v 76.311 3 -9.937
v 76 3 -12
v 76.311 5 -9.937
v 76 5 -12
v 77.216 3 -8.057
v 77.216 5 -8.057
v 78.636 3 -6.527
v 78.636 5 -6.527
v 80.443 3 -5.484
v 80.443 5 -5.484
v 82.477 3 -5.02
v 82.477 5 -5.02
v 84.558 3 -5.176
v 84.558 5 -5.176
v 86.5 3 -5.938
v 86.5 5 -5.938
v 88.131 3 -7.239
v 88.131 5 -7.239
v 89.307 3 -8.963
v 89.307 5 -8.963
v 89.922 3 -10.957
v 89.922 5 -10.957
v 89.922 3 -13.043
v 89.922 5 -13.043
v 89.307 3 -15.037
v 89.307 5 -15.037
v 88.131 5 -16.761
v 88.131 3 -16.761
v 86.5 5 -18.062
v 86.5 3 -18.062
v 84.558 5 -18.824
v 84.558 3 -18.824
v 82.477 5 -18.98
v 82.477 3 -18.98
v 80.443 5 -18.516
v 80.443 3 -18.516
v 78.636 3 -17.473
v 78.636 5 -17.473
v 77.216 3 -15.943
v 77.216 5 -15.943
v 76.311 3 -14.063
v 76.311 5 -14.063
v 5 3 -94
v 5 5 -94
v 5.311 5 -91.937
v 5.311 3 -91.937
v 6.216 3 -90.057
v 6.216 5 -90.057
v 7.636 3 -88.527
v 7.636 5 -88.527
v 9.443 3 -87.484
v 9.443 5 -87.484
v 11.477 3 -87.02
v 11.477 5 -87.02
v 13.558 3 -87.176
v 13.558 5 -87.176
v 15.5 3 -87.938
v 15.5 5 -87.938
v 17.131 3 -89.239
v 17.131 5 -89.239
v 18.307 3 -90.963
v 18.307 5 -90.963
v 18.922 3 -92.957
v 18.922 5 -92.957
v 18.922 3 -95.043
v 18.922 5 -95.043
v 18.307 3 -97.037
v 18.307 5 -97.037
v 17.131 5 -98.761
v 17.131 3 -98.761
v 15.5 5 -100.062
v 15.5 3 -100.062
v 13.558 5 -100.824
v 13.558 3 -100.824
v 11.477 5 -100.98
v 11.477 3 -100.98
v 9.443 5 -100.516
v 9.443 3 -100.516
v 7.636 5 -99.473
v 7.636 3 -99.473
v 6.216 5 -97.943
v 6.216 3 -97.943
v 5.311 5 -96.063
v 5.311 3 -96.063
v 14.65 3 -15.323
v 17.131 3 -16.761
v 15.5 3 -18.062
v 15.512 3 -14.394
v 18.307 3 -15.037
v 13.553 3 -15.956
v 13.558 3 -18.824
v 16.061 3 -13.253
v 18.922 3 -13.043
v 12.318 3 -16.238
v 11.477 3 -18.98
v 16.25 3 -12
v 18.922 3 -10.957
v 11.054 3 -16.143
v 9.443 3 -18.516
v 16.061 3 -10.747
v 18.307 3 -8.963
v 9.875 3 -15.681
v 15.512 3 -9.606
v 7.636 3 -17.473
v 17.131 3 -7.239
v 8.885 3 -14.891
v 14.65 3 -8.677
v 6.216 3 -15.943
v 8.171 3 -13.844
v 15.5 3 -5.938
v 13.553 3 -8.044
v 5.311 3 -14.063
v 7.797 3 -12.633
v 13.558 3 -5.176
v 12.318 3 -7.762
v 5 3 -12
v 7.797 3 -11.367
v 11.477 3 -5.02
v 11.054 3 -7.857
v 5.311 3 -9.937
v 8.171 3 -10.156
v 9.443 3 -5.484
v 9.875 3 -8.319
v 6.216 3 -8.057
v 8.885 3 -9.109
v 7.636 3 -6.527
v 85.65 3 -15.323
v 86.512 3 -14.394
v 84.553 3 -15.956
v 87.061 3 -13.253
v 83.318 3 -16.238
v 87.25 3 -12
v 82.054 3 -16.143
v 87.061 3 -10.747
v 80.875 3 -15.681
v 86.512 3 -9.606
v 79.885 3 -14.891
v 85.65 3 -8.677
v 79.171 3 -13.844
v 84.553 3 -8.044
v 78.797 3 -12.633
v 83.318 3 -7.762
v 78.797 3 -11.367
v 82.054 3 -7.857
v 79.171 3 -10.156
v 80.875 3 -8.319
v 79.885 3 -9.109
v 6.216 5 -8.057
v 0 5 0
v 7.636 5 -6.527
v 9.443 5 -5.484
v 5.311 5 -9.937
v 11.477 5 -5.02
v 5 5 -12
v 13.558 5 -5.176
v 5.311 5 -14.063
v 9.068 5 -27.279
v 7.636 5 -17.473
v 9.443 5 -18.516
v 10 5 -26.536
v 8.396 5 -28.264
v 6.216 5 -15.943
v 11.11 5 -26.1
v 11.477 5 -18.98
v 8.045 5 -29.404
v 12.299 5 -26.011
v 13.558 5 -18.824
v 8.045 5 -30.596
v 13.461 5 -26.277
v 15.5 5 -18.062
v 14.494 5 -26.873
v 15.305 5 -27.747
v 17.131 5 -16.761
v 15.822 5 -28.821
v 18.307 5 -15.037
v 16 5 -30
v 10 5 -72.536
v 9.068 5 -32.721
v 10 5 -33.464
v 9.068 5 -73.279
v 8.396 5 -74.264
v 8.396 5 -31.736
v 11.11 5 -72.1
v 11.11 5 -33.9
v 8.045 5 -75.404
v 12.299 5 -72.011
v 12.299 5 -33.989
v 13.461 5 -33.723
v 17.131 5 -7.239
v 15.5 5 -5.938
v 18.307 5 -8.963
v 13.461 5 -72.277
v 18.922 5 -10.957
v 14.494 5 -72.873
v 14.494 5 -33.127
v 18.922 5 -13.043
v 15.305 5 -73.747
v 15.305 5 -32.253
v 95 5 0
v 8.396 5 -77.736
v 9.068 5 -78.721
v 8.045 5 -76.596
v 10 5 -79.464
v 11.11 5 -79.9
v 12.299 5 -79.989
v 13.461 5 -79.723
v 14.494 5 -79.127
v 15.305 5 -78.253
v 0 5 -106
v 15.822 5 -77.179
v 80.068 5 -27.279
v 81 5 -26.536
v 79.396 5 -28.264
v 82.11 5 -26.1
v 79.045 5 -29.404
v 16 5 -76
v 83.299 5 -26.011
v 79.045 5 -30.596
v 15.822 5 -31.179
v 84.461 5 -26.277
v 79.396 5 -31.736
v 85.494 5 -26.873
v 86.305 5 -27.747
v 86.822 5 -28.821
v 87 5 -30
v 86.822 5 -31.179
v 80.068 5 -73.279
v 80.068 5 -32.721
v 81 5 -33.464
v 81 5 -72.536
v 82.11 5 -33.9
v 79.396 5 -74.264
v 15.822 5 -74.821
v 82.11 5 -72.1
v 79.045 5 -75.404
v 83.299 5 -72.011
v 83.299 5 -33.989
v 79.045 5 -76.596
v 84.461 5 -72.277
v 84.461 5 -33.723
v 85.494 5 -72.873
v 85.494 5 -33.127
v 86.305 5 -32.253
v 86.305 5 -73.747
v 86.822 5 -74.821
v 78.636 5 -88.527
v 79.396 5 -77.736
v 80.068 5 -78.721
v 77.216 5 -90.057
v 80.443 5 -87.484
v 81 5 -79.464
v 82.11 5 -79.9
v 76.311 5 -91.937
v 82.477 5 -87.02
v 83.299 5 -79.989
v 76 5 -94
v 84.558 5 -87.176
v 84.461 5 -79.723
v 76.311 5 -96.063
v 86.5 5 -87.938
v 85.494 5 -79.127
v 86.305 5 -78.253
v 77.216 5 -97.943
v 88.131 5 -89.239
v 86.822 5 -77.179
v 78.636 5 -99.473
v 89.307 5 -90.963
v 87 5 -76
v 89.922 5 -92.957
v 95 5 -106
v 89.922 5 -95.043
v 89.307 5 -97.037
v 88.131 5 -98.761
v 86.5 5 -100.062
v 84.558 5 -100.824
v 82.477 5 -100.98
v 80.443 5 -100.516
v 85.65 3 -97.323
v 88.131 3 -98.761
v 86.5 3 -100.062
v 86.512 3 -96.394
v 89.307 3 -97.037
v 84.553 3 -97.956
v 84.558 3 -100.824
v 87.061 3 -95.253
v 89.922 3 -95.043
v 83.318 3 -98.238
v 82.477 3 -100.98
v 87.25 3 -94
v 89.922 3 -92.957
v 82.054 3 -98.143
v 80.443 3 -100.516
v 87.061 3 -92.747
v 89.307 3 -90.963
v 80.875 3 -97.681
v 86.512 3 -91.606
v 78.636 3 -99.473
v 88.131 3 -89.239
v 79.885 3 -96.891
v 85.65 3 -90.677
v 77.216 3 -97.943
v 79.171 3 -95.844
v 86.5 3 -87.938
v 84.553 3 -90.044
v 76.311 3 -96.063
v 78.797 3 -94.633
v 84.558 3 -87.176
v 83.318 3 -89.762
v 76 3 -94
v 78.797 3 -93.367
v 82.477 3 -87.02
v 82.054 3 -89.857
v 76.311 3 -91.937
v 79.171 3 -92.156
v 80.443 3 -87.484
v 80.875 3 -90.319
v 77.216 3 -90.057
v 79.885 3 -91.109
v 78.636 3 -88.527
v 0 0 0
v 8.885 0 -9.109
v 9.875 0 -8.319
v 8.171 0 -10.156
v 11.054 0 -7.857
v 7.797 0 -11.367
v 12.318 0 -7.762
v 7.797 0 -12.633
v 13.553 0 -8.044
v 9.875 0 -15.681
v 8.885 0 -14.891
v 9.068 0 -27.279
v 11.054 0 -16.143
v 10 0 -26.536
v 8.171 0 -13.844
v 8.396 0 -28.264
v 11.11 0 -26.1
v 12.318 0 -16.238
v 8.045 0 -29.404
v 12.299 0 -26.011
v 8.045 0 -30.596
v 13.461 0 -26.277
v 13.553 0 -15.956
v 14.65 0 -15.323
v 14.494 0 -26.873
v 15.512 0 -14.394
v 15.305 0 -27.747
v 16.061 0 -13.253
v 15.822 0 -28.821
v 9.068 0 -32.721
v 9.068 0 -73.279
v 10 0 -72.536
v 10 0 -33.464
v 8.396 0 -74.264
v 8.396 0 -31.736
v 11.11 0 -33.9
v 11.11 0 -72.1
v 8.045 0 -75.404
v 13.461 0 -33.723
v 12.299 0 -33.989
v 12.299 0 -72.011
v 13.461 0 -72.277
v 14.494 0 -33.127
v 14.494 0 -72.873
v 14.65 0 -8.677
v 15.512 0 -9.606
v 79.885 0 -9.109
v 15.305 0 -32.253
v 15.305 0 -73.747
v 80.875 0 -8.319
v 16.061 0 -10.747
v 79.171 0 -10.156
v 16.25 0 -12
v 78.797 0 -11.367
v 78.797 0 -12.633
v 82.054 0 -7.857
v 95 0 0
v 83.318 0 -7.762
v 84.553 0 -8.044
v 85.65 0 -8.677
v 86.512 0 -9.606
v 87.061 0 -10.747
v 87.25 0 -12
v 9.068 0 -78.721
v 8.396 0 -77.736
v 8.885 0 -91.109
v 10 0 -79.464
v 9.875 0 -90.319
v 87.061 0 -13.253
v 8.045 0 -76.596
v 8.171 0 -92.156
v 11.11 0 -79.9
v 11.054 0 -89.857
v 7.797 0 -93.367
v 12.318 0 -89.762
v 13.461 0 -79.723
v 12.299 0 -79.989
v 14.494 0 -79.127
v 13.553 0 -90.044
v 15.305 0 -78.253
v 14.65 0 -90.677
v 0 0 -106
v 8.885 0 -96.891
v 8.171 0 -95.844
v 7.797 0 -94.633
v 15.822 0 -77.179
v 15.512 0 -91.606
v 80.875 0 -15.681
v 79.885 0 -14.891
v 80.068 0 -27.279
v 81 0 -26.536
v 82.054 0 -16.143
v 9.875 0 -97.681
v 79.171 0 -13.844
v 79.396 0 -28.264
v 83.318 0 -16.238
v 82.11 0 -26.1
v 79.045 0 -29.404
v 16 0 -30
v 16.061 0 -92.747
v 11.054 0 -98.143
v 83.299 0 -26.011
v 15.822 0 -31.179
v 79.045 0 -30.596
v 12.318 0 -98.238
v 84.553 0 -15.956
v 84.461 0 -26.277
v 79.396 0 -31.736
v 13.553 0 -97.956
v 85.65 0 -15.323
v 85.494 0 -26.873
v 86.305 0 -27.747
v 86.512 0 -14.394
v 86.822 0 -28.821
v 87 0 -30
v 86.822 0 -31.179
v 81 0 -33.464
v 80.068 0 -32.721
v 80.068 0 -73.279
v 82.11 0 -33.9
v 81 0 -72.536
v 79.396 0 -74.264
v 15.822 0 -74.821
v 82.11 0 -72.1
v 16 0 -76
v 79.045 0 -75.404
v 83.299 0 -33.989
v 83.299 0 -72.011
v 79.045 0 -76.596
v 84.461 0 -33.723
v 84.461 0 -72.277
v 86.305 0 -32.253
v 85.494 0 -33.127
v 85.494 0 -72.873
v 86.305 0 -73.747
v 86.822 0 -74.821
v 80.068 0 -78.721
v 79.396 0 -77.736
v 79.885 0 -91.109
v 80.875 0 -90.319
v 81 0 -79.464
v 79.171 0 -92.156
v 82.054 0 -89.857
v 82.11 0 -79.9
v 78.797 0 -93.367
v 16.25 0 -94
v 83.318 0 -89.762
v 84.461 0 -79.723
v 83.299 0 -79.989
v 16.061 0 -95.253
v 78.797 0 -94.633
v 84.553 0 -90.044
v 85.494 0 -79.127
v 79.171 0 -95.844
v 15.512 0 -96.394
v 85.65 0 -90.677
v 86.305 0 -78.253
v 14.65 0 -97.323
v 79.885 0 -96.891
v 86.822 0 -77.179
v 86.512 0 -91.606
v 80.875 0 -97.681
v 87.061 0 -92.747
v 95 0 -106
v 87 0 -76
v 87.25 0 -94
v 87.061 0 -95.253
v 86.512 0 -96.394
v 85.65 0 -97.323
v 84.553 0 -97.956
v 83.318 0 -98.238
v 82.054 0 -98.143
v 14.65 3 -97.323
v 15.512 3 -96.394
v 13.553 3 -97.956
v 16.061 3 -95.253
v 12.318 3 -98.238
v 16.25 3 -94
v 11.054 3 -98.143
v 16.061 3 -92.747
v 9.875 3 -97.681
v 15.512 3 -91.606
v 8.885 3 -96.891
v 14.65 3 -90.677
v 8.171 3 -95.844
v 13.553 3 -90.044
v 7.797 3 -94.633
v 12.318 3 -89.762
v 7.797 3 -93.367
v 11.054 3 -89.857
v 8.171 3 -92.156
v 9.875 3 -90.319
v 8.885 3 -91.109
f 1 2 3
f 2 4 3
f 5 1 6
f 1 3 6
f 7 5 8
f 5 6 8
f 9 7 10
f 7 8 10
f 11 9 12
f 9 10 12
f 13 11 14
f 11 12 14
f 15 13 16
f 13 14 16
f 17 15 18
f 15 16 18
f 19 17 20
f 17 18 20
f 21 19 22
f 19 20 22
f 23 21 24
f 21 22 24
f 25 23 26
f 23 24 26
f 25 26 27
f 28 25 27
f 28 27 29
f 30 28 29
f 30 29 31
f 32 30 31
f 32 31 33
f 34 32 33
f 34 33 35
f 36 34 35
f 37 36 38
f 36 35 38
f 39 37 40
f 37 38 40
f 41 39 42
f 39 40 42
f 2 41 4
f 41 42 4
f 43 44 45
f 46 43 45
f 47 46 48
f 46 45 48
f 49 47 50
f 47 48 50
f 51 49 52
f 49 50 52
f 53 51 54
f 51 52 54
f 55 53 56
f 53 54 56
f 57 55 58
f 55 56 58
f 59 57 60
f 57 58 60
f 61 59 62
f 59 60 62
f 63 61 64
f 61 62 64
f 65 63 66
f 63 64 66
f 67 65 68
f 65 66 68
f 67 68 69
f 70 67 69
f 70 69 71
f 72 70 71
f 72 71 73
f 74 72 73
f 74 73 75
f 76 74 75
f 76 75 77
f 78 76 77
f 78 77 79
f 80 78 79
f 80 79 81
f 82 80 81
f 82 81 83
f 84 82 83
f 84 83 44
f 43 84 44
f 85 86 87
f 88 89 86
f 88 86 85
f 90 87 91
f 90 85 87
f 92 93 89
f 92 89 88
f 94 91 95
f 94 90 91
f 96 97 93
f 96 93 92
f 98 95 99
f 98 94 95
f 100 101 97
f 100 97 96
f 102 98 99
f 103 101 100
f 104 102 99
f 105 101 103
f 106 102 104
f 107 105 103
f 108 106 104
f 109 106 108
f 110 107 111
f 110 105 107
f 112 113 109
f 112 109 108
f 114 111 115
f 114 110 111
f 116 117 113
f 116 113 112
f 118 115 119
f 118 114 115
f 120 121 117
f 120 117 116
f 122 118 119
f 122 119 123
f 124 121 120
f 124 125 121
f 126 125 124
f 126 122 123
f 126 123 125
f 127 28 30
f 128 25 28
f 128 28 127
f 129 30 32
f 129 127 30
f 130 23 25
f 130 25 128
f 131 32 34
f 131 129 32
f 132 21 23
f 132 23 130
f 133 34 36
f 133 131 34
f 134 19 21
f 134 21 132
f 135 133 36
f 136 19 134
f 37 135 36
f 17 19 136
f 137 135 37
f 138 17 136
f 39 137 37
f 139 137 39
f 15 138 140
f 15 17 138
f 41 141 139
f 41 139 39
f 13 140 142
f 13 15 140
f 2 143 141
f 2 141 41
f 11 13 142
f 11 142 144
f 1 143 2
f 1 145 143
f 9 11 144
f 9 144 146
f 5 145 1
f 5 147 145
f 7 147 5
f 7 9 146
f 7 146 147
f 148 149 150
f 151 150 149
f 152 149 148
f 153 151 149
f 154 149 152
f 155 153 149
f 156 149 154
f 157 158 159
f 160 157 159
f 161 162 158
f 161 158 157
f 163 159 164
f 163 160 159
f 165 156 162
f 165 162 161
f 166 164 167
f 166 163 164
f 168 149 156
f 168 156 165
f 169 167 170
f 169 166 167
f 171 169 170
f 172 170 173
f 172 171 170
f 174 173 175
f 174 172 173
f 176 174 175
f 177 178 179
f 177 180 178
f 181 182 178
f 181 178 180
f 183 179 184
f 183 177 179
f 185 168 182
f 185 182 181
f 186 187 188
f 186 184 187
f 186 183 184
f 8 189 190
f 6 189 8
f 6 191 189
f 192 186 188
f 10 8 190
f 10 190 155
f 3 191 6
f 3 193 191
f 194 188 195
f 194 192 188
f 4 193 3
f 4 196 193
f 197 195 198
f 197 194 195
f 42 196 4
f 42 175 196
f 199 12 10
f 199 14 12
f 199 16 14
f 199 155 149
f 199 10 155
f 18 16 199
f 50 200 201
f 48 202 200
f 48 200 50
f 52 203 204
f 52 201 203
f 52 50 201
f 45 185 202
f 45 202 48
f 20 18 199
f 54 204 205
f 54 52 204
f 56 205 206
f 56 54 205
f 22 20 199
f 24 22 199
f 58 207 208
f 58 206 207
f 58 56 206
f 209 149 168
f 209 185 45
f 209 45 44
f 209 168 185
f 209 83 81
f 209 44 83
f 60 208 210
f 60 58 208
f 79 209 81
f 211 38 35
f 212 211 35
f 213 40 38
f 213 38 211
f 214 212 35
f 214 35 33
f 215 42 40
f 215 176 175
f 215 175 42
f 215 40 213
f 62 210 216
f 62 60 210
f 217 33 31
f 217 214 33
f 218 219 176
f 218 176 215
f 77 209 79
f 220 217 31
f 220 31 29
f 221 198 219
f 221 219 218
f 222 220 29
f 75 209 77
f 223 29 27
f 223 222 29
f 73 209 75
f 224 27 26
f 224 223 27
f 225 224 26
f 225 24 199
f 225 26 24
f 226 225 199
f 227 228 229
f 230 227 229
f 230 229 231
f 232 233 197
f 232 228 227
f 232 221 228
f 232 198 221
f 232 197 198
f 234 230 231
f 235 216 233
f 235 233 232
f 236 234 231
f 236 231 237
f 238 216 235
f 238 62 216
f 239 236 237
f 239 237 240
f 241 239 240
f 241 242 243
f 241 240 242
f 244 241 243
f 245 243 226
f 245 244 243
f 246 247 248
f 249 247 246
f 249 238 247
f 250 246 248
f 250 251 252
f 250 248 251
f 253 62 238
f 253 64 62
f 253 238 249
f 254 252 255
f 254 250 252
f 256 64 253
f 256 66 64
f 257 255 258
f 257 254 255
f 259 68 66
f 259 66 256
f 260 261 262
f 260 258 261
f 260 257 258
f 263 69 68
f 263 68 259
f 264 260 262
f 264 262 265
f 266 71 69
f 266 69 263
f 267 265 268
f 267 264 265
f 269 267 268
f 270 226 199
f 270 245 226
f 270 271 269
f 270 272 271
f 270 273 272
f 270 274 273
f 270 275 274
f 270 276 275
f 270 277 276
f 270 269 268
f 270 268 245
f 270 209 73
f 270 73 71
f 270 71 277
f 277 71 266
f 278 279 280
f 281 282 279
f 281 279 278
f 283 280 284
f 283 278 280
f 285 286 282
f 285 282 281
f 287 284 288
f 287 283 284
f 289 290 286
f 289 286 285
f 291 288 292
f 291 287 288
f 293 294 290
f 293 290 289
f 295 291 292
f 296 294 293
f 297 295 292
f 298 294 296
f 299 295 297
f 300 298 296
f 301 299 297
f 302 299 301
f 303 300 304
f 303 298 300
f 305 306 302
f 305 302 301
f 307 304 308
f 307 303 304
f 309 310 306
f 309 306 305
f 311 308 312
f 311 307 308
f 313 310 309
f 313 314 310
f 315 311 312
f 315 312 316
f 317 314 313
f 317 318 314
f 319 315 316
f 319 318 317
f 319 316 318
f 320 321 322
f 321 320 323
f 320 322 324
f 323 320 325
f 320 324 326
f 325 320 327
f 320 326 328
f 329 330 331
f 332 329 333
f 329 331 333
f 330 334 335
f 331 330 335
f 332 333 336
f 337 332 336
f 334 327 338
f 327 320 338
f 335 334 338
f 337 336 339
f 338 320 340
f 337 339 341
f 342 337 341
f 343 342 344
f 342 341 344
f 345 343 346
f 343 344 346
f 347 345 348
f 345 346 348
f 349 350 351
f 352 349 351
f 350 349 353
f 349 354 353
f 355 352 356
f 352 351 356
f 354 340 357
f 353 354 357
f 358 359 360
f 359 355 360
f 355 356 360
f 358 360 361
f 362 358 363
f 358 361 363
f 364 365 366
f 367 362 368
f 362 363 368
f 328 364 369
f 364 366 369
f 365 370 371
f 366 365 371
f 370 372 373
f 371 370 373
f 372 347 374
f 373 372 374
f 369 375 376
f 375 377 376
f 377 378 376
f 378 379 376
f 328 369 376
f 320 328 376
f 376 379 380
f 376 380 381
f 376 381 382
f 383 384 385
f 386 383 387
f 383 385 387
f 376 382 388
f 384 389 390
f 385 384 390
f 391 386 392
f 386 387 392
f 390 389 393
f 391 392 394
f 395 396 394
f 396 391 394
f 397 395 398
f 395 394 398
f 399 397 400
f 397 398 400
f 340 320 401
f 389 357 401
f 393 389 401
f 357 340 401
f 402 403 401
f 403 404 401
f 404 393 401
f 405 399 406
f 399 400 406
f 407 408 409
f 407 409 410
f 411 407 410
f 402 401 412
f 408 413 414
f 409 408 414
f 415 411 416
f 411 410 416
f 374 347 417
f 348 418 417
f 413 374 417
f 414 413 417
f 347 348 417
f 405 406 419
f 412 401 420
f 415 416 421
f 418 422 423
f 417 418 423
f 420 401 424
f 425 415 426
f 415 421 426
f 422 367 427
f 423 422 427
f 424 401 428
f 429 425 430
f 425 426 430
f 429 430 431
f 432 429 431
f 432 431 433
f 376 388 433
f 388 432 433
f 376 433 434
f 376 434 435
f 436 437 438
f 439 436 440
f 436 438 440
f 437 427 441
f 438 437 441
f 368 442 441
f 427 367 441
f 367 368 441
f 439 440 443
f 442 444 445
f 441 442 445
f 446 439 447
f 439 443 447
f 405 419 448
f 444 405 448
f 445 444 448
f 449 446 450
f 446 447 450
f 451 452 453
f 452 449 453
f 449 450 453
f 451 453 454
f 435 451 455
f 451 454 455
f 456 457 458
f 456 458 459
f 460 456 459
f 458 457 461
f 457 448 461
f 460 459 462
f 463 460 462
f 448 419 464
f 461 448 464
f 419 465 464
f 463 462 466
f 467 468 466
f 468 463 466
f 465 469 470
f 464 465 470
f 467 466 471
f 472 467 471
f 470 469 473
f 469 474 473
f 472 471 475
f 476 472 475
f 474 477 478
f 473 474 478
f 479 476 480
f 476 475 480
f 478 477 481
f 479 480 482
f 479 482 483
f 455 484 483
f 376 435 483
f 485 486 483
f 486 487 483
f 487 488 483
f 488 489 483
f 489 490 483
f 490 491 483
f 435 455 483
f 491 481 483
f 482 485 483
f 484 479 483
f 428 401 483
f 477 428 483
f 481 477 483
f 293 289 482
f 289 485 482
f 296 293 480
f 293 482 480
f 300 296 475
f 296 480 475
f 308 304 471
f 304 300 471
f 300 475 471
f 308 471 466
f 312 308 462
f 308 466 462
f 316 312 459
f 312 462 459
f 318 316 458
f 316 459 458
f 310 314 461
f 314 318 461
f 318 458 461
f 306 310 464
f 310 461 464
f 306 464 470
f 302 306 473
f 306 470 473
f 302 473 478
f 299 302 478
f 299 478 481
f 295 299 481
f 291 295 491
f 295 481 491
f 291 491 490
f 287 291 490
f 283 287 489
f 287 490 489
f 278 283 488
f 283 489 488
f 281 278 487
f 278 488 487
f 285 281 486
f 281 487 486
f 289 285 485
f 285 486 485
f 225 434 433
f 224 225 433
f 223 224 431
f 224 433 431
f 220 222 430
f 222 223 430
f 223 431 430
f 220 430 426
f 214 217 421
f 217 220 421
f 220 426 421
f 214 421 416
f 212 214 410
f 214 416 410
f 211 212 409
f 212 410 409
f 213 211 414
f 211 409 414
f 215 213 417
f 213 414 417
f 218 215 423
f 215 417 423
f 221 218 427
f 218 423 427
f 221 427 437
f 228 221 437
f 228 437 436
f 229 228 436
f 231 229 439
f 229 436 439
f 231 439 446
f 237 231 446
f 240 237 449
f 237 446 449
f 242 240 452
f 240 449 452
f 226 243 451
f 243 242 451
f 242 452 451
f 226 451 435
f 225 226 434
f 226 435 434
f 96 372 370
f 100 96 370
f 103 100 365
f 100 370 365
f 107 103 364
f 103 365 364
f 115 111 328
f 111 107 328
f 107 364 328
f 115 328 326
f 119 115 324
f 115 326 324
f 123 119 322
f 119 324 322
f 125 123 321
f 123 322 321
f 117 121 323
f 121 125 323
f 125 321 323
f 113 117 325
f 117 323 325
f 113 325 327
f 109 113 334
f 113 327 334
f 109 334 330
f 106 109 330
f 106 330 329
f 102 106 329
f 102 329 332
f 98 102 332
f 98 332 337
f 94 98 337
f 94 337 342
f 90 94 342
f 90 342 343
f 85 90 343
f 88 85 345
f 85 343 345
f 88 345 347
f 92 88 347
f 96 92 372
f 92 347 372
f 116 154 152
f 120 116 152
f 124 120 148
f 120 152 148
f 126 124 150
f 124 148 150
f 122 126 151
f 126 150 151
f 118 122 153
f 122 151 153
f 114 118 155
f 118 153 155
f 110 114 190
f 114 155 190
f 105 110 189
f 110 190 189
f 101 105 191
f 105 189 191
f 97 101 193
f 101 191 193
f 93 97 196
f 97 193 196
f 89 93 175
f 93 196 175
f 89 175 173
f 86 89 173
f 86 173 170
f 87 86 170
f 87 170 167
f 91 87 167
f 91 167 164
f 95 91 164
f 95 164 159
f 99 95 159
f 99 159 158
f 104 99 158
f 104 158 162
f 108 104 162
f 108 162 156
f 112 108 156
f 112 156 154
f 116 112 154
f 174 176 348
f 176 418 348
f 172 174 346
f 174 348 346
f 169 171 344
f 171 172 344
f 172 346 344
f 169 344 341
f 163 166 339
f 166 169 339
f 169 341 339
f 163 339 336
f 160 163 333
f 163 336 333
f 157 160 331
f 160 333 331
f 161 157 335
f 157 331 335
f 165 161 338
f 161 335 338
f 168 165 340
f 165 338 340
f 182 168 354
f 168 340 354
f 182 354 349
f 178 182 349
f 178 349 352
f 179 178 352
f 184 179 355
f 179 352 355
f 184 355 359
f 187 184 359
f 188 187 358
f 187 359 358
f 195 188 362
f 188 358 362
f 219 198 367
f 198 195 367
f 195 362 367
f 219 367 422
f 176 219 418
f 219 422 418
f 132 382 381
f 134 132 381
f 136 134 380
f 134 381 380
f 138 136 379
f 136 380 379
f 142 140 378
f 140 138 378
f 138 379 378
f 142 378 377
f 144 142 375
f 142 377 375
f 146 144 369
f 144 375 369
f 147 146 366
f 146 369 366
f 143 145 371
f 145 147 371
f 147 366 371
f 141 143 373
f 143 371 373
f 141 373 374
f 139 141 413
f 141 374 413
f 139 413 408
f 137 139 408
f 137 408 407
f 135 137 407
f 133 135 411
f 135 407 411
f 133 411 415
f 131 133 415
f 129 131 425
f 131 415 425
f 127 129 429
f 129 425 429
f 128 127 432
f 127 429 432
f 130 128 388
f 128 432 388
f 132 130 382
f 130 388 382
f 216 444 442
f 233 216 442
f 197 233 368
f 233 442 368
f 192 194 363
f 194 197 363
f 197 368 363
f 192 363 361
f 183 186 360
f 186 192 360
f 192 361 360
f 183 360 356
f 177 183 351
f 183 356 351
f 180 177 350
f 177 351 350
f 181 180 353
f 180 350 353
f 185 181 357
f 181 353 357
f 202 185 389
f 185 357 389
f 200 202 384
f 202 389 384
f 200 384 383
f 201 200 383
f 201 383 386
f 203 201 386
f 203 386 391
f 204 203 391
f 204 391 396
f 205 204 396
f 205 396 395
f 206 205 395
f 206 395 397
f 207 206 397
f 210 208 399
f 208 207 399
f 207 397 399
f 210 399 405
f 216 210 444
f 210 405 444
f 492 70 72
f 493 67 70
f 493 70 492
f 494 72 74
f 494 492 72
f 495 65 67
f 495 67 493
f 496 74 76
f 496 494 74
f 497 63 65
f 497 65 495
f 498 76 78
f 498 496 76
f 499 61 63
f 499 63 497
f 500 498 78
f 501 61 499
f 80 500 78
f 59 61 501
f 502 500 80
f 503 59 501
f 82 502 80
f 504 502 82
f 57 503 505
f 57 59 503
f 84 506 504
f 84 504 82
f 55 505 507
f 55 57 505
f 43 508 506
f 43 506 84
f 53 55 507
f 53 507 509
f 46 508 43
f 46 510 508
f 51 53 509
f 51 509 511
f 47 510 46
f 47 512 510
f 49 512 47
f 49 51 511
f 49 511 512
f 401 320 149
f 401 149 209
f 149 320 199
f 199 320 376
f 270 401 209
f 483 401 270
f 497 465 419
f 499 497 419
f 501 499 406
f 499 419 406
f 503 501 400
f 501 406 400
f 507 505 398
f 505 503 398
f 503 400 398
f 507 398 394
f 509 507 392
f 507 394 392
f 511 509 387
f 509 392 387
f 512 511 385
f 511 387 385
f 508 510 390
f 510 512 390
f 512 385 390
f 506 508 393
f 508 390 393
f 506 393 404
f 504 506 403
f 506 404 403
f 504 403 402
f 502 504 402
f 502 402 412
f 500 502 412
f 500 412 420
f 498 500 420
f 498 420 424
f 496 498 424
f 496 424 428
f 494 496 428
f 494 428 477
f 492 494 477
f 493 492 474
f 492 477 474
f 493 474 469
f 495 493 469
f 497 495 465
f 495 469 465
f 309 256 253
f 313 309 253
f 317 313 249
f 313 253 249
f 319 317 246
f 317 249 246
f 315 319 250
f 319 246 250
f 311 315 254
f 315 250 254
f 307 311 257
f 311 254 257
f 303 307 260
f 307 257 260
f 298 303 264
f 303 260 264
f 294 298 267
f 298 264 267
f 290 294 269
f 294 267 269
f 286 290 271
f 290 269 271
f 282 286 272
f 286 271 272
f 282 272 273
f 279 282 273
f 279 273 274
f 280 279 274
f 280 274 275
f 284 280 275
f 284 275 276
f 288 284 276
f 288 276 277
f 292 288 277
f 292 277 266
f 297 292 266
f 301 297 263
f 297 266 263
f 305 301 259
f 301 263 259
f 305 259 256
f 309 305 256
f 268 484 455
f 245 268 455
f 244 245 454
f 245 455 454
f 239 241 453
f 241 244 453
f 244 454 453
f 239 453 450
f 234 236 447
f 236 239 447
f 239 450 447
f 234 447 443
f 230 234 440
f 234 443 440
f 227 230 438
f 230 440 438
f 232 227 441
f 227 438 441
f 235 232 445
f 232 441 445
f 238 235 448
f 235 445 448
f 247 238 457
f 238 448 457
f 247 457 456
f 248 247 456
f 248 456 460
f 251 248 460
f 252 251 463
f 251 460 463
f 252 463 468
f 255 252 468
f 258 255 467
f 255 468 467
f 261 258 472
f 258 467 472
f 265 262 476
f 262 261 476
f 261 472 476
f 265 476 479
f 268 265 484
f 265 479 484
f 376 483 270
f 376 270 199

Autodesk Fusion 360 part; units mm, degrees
sketch "Sketch1" plane through (0, 0, 0) normal (0, 1, 0) x (1, 0, 0)
  line L0 (0, 0) -> (95, 0)
  line L1 (0, 0) -> (0, 106)
  line L2 (0, 106) -> (95, 106)
  line L3 (95, 106) -> (95, 0)
  line L4 (95, 106) -> (83, 106)
  circle A0 centre (83, 94) radius 7
  line L5 (0, 106) -> (12, 106)
  circle A1 centre (12, 94) radius 7
  circle A2 centre (83, 76) radius 4
  circle A3 centre (12, 76) radius 4
  circle A4 centre (83, 30) radius 4
  circle A5 centre (83, 12) radius 7
  circle A6 centre (12, 30) radius 4
  circle A7 centre (12, 12) radius 7
  circle A8 centre (83, 94) radius 4.25
  circle A9 centre (12, 94) radius 4.25
  circle A10 centre (12, 12) radius 4.25
  circle A11 centre (83, 12) radius 4.25
  dimension "d26" = 8.5
  dimension "d27" = 8.5
  dimension "d28" = 8.5
extrude "Extrude1" add sketch "Sketch1" along normal blind 5 contours L0 L1 L2 L3 L4 L5 | A0 | A1 | A5 | A7
sketch "Sketch2" plane through (0, 5, 0) normal (0, 1, 0) x (-1, 0, 0)
  circle A0 centre (-12, -94) radius 4.25
  circle A1 centre (-83, -76) radius 4
  circle A2 centre (-83, -94) radius 4.25
  circle A3 centre (-12, -76) radius 4
  circle A4 centre (-83, -30) radius 4
  circle A5 centre (-12, -30) radius 4
  circle A6 centre (-83, -12) radius 4.25
  circle A7 centre (-12, -12) radius 4.25
  line L0 (0, 0) -> (-95, 0)
  line L1 (-95, 0) -> (-95, -106)
  line L2 (-95, -106) -> (0, -106)
  line L3 (0, -106) -> (0, 0)
  circle A8 centre (-12, -12) radius 7
  circle A9 centre (-83, -12) radius 7
  circle A10 centre (-83, -94) radius 7
  circle A11 centre (-12, -94) radius 7
  dimension "d31" = 14
  dimension "d32" = 14
  dimension "d33" = 14
  dimension "d34" = 14
extrude "Extrude2" cut sketch "Sketch2" against normal blind 2 contours A8 | A9 | A10 | A11
